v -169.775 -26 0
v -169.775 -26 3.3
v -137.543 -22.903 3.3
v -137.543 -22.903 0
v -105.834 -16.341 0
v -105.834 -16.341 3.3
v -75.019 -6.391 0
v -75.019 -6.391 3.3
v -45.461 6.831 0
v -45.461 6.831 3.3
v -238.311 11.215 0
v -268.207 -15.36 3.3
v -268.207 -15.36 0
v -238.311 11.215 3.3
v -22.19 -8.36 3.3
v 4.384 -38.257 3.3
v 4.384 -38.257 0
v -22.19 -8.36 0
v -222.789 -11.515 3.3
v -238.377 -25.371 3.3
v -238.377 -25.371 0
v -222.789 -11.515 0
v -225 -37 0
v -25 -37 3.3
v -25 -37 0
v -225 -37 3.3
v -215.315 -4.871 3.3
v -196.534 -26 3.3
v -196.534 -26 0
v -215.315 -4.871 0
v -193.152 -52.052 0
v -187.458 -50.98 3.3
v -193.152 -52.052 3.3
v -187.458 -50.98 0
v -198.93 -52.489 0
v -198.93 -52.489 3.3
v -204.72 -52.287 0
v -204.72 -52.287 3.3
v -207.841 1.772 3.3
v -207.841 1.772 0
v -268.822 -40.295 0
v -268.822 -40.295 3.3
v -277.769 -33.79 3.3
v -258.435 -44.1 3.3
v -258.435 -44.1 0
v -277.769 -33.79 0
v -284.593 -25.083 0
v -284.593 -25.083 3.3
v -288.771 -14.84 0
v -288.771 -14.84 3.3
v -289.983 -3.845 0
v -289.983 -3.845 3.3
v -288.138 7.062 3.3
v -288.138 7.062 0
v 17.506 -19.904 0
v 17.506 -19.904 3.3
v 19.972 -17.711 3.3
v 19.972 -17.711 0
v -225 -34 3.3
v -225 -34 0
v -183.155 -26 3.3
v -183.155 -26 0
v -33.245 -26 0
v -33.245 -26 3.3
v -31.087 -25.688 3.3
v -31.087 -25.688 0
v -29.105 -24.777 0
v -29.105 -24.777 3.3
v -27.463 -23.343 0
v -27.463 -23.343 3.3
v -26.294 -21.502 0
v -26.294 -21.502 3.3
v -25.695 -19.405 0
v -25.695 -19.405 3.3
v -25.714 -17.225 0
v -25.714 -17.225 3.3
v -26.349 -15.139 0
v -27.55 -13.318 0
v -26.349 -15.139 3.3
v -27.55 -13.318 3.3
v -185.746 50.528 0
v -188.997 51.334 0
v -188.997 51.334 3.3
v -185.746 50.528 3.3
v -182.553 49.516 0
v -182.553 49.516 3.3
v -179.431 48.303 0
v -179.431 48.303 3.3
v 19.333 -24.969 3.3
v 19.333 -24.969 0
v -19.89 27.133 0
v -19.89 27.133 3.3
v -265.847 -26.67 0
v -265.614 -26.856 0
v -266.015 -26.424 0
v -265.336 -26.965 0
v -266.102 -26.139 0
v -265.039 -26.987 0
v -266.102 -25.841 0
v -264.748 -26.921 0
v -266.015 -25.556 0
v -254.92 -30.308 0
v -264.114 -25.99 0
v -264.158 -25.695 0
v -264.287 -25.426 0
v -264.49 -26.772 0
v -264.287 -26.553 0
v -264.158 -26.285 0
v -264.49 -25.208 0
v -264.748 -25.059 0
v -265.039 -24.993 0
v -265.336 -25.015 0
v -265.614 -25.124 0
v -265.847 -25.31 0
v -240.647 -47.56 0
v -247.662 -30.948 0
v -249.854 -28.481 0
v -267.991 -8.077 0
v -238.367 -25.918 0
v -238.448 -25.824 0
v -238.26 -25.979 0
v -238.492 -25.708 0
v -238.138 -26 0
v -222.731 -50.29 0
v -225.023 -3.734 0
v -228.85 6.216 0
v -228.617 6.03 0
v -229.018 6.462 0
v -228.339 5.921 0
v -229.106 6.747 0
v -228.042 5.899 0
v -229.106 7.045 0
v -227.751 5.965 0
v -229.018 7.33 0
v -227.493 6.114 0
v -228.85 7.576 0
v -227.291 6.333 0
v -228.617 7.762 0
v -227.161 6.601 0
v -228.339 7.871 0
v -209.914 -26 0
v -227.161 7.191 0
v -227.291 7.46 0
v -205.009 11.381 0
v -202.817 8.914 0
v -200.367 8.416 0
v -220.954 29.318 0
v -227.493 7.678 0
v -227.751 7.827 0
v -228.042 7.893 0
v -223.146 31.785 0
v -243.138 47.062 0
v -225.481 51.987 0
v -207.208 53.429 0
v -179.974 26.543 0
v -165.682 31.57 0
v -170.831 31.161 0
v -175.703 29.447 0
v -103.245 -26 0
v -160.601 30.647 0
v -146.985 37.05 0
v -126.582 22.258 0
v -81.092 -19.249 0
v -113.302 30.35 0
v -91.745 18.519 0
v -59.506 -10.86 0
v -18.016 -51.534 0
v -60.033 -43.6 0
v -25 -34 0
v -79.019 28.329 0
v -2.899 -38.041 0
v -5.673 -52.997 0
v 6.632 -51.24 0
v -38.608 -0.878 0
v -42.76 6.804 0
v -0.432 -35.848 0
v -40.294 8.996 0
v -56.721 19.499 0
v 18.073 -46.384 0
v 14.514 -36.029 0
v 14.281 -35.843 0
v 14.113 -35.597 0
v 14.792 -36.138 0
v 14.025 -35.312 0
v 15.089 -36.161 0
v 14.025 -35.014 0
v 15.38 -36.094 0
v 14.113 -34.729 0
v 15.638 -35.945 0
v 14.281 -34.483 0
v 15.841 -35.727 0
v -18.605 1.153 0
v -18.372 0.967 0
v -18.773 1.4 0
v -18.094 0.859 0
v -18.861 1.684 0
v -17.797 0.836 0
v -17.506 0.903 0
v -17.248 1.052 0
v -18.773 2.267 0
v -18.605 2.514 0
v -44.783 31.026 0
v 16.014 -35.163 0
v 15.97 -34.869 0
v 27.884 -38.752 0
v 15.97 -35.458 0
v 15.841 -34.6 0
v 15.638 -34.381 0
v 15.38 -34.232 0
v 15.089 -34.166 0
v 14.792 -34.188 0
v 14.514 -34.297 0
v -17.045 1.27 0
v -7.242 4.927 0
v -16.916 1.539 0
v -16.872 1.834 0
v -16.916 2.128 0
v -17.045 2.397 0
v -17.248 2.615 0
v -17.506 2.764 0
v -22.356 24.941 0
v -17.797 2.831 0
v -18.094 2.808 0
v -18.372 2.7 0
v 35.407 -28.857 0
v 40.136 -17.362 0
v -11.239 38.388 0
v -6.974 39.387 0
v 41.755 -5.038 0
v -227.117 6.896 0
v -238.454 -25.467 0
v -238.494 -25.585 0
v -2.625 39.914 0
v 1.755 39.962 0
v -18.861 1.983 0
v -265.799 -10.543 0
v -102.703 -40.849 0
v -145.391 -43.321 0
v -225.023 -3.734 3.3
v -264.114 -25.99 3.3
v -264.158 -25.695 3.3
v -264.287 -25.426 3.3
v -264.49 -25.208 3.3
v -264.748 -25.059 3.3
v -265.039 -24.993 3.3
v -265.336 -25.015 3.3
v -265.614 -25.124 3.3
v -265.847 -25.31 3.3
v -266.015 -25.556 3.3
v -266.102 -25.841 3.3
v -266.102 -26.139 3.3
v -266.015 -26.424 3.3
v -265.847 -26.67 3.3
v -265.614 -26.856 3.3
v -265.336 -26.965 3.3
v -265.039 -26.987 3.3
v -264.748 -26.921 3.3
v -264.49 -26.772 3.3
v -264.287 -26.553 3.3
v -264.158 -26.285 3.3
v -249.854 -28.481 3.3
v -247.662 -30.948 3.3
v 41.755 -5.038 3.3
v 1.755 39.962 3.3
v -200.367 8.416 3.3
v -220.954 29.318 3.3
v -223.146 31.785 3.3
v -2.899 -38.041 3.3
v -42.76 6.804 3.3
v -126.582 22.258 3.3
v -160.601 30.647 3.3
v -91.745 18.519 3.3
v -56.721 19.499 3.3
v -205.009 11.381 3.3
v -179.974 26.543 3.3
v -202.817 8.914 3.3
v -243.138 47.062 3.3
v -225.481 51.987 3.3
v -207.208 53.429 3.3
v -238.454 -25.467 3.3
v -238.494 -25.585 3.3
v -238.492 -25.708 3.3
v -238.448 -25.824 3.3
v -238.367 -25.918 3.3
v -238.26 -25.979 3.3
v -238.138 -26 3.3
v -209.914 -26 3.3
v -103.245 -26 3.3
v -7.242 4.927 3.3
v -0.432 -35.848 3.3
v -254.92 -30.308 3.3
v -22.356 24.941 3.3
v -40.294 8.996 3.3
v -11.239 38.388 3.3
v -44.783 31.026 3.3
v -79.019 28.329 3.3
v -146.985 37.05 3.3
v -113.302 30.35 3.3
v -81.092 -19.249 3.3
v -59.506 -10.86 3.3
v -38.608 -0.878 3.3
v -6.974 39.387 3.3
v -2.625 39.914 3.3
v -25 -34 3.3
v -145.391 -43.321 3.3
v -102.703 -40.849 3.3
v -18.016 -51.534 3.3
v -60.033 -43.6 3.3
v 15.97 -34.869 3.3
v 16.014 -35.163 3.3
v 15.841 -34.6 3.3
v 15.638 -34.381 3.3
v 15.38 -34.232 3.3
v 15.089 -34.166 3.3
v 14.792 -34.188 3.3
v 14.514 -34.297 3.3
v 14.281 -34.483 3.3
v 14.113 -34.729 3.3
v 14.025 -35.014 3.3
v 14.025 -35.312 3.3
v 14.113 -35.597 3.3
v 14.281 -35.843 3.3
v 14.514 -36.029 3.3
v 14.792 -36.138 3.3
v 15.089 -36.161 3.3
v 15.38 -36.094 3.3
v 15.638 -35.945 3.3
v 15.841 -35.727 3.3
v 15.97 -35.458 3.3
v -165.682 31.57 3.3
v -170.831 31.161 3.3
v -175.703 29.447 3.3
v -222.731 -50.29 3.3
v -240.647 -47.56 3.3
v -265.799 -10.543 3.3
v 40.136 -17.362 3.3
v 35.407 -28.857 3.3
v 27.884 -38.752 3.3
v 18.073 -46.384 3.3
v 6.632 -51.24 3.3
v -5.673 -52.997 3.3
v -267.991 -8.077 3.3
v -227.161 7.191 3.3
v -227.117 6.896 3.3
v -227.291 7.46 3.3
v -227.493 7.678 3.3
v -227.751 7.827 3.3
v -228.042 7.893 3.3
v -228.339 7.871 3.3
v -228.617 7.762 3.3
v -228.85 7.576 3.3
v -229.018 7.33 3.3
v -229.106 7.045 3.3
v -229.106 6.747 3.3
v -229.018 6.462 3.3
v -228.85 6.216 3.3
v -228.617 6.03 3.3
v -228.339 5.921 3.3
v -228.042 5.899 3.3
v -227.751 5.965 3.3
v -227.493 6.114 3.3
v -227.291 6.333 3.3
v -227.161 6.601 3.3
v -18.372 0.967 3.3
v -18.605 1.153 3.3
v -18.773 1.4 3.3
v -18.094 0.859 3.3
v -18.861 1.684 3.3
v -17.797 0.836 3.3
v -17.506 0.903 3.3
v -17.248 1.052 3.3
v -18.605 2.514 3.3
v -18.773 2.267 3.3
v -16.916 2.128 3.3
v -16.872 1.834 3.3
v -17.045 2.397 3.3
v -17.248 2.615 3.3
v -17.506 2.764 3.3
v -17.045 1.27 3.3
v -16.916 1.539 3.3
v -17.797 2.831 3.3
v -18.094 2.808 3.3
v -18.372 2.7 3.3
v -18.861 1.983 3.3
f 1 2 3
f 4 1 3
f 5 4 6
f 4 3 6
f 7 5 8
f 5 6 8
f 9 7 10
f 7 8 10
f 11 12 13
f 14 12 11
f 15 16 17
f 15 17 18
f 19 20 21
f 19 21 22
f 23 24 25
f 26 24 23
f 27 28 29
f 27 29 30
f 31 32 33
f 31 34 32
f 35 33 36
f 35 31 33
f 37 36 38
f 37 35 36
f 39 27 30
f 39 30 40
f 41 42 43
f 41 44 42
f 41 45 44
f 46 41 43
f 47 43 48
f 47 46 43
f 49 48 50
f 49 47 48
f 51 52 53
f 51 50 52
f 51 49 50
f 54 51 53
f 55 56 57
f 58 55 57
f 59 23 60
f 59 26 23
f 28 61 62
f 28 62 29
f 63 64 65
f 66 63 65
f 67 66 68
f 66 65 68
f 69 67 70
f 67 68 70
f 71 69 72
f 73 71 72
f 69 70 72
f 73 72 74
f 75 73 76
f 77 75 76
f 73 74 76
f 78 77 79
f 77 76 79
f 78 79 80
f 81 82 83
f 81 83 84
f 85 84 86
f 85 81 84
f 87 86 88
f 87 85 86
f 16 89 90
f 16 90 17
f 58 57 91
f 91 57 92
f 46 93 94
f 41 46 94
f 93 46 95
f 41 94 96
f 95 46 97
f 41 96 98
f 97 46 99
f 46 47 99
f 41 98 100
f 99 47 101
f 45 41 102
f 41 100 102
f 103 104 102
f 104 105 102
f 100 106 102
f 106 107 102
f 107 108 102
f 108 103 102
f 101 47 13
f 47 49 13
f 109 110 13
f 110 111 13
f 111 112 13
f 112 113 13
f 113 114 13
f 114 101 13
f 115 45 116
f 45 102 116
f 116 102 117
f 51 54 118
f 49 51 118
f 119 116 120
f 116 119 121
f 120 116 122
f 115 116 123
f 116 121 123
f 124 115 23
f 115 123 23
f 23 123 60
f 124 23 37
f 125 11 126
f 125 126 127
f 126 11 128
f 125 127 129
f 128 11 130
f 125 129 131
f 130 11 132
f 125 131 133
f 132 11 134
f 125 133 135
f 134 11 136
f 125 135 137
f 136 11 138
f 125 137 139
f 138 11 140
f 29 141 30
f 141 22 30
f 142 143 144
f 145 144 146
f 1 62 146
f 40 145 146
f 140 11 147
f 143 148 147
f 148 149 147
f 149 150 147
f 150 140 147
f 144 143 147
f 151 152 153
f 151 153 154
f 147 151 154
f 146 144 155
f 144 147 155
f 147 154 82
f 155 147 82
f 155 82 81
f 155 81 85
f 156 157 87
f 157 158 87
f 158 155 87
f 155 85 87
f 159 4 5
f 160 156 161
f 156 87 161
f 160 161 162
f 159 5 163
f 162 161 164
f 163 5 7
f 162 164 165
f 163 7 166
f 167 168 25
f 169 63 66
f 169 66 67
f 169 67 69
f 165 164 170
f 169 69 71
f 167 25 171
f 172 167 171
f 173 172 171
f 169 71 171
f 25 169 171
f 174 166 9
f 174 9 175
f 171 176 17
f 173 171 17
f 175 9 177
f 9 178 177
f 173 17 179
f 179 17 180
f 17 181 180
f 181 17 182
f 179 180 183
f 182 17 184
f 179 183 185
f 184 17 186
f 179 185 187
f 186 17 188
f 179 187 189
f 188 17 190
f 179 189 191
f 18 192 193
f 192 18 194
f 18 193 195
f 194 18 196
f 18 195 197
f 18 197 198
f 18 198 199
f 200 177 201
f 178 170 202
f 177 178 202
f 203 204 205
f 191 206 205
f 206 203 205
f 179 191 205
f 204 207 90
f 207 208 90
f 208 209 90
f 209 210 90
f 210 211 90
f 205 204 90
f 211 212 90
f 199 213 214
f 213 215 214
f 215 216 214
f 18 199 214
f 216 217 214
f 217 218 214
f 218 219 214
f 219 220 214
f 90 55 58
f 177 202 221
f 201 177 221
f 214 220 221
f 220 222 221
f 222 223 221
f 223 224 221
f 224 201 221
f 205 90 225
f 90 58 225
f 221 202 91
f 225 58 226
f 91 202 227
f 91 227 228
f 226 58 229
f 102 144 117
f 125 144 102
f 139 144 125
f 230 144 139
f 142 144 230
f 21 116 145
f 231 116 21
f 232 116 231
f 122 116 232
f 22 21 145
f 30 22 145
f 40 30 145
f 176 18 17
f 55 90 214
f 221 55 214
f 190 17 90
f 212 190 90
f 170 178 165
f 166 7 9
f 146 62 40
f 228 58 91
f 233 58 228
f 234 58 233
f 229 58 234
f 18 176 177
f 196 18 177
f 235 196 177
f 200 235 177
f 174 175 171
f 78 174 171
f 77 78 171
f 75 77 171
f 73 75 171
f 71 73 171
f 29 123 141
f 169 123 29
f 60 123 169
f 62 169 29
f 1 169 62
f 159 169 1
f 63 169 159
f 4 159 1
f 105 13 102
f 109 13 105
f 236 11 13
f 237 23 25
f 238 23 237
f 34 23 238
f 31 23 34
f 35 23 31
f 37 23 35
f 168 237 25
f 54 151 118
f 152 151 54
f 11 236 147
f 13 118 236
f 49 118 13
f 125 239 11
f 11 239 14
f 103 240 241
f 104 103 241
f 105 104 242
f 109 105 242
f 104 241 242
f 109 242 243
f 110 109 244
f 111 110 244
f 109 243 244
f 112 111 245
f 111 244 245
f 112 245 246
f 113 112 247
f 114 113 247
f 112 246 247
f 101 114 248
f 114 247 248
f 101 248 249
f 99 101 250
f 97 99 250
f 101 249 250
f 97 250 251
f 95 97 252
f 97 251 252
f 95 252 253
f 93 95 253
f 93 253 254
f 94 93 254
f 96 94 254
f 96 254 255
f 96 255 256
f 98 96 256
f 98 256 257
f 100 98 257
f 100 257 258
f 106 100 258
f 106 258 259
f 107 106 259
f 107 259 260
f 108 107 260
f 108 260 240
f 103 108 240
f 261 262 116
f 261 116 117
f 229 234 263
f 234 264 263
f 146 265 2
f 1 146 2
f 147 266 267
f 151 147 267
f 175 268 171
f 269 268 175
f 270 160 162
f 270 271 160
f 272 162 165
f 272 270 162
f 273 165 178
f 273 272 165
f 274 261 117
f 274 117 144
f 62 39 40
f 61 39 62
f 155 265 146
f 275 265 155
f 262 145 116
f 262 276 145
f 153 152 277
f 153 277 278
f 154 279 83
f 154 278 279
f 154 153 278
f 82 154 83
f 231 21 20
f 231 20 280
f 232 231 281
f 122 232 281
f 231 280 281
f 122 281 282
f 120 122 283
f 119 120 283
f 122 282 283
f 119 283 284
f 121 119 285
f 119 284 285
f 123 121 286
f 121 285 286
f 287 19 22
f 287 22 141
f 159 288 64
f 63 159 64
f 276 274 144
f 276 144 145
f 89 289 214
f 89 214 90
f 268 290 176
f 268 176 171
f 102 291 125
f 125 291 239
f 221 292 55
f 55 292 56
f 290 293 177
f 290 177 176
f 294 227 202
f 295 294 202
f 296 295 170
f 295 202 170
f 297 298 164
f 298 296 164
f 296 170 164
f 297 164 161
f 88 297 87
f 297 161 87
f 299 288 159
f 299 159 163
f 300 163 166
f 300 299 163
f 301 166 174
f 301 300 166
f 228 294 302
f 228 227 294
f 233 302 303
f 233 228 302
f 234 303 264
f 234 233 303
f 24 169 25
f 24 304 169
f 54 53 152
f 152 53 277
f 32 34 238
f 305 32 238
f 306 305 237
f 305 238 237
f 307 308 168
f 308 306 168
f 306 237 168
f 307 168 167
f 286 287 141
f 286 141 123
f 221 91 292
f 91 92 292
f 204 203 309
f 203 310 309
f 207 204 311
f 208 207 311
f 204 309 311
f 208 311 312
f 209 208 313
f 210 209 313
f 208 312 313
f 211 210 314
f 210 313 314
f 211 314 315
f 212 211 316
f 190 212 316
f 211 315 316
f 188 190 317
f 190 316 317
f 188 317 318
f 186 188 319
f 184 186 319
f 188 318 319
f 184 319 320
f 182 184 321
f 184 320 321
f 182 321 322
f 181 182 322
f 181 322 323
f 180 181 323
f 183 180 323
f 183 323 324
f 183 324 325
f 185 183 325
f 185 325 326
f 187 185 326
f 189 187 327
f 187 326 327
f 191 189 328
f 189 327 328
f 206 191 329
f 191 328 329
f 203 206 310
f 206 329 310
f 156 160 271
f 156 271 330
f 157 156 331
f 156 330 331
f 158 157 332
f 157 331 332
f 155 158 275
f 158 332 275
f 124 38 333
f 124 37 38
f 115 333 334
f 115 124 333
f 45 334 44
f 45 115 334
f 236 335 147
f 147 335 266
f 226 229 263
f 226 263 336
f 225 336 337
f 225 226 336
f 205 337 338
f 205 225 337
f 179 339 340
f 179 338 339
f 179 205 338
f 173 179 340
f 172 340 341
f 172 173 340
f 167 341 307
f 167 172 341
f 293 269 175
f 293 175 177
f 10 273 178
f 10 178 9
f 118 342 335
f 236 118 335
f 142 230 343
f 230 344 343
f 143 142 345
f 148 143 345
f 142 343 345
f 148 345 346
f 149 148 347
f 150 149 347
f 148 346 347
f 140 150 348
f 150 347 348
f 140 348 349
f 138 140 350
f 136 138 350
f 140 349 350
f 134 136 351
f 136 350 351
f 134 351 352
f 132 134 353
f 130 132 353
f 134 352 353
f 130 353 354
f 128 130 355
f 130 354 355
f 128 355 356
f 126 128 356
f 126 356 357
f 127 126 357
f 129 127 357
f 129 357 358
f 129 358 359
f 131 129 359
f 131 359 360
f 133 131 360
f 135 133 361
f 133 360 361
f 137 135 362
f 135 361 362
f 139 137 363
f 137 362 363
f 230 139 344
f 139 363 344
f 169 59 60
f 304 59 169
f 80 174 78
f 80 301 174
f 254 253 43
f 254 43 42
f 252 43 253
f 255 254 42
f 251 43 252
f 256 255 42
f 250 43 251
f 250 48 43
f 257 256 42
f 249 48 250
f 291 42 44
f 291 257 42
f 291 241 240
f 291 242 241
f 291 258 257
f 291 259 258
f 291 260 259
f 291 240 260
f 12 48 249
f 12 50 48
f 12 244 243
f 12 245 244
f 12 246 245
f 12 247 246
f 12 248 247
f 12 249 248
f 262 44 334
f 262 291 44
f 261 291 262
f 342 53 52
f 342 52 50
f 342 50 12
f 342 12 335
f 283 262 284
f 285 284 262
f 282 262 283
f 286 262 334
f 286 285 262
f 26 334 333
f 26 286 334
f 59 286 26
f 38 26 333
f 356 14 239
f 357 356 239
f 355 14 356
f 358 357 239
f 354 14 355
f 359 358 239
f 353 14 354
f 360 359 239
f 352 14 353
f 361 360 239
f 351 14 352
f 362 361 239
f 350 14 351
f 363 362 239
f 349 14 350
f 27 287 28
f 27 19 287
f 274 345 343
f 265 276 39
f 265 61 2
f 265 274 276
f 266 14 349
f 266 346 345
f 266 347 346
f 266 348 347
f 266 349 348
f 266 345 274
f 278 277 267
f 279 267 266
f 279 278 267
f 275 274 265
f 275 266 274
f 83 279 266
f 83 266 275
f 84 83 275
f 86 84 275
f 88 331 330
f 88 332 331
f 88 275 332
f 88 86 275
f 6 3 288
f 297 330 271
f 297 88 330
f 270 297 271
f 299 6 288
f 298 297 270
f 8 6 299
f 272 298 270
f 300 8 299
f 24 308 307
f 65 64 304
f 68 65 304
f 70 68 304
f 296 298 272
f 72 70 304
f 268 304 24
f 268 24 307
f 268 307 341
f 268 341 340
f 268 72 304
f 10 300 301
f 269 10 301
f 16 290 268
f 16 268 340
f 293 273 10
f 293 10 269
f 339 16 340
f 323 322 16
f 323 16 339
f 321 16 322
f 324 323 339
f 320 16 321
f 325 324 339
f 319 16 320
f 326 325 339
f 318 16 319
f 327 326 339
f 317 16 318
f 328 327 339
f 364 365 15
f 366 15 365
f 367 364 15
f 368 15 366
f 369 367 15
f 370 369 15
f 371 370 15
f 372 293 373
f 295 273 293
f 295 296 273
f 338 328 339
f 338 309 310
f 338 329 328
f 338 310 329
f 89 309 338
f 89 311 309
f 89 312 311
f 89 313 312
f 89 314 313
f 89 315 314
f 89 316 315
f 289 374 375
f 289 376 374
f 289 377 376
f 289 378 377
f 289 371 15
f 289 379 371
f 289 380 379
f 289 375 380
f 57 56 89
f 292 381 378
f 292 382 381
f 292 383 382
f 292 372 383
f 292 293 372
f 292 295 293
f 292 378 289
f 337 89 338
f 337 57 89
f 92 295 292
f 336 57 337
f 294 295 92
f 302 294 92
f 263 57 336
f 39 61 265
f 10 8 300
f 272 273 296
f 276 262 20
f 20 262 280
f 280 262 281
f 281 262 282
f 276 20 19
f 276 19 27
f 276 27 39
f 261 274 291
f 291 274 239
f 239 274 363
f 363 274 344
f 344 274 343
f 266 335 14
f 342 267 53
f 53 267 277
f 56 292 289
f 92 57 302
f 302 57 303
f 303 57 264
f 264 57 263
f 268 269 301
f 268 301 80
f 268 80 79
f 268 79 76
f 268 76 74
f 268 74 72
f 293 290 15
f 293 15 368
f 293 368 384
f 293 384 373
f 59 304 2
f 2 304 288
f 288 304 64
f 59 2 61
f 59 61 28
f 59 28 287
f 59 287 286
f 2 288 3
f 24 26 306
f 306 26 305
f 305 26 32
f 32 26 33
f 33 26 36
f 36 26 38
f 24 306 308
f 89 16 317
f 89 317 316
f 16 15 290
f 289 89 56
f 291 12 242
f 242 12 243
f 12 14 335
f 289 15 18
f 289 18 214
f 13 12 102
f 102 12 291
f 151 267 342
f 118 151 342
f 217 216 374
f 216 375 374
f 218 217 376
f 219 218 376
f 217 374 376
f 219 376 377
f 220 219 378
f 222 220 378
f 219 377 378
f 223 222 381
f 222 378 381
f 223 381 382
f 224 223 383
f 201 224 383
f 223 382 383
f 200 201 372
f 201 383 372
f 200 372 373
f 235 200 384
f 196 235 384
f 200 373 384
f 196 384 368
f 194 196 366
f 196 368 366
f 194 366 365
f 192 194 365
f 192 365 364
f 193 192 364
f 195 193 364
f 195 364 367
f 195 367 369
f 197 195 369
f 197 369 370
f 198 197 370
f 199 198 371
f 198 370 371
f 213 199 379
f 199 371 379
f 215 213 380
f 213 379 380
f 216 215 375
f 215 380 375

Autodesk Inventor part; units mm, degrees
ref_plane "YZ Plane" through (0, 0, 0) normal (1, 0, 0) x (0, 1, 0)
ref_plane "XZ Plane" through (0, 0, 0) normal (0, 1, 0) x (-1, 0, 0)
ref_plane "XY Plane" through (0, 0, 0) normal (0, 0, 1) x (1, 0, 0)
sketch "Boceto2" plane through (0, 0, 0) normal (0, 0, 1) x (1, 0, 0)
  circle A0 centre (0, 0) radius 40
  circle A1 centre (-200, 0) radius 52.5
  circle A2 centre (-250, -5) radius 40
  arc A3 (-258.4353, -44.1005) -> (-204.7198, -52.2874) centre (-164.804, 389.9147) ccw
  arc A4 (-188.9974, 51.3341) -> (-279.8859, 21.5863) centre (-208.9069, -41.5562) ccw
  arc A5 (-179.4312, 48.3029) -> (-11.2392, 38.3885) centre (-81.4844, 278.3169) ccw
  arc A6 (-46.5935, -31) -> (31.225, 25) centre (-6.245, -5) ccw
  arc A7 (-18.0162, -51.5343) -> (-187.4585, -50.98) centre (-103.8482, -390.8466) ccw
  dimension "d42" = 80
  dimension "d43" = 200
  dimension "d44" = 105
  dimension "d45" = 80
  dimension "d46" = 50
  dimension "d47" = 5
  dimension "d48" = 444
  dimension "d49" = 95
  dimension "d50" = 250
  dimension "d51" = 350
  dimension "d52" = 5
  dimension "d53" = 48
  dimension "d54" = 31
extrude "Extrusión1" add sketch "Boceto2" along normal blind 3.3
sketch "Boceto3" plane through (0, 0, 3.3) normal (0, 0, 1) x (1, 0, 0)
  arc A0 (-179.4312, 48.3029) -> (-11.2392, 38.3885) centre (-81.4844, 278.3169) ccw projected
  arc A1 (31.225, 25) -> (-11.2392, 38.3885) centre (0, 0) ccw projected
  arc A2 (-179.4312, 48.3029) -> (-11.2392, 38.3885) centre (-81.4844, 278.3169) ccw projected
  arc A3 (-179.4312, 48.3029) -> (-188.9974, 51.3341) centre (-200, 0) ccw projected
  arc A4 (-188.9974, 51.3341) -> (-279.8859, 21.5863) centre (-208.9069, -41.5562) ccw projected
  arc A5 (-279.8859, 21.5863) -> (-258.4353, -44.1005) centre (-250, -5) ccw projected
  arc A6 (-258.4353, -44.1005) -> (-204.7198, -52.2874) centre (-164.804, 389.9147) ccw projected
  arc A7 (-204.7198, -52.2874) -> (-187.4585, -50.98) centre (-200, 0) ccw projected
  arc A8 (-18.0162, -51.5343) -> (-187.4585, -50.98) centre (-103.8482, -390.8466) ccw projected
  arc A9 (-18.0162, -51.5343) -> (31.225, 25) centre (-6.245, -5) ccw projected
  arc A10 (-18.0162, -51.5343) -> (31.225, 25) centre (-6.245, -5) ccw projected
  arc A11 (31.225, 25) -> (-11.2392, 38.3885) centre (0, 0) ccw projected
  line L0 (1.755, 39.9615) -> (41.755, -5.0385)
  arc A12 (-279.8859, 21.5863) -> (-258.4353, -44.1005) centre (-250, -5) ccw projected
  line L1 (-288.1379, 7.0623) -> (-243.1379, 47.0623)
  arc A13 (-188.9974, 51.3341) -> (-279.8859, 21.5863) centre (-208.9069, -41.5562) ccw projected
  line L2 (-7.2418, 4.9269) -> (19.3327, -24.9694)
  line L3 (19.3327, -24.9694) -> (4.3845, -38.2567)
  line L4 (4.3845, -38.2567) -> (-22.19, -8.3603)
  line L5 (-22.19, -8.3603) -> (-7.2418, 4.9269)
  line L6 (-268.207, -15.36) -> (-254.9197, -30.3082)
  line L7 (-254.9197, -30.3082) -> (-225.0234, -3.7336)
  line L8 (-225.0234, -3.7336) -> (-238.3106, 11.2146)
  line L9 (-268.207, -15.36) -> (-238.3106, 11.2146)
  line L10 (-265.7987, -10.5434) -> (-220.9541, 29.3185)
  line L11 (-223.1465, 31.7849) -> (-267.9911, -8.0769)
  line L12 (-249.854, -28.4812) -> (-205.0094, 11.3807)
  line L13 (-205.0094, 11.3807) -> (-202.817, 8.9142)
  line L14 (-202.817, 8.9142) -> (-247.6616, -30.9476)
  line L15 (-247.6616, -30.9476) -> (-249.854, -28.4812)
  circle A14 centre (-228.1168, 6.8962) radius 1
  circle A15 centre (-265.1136, -25.9898) radius 1
  line L16 (-22.3561, 24.9409) -> (17.5057, -19.9037)
  line L17 (17.5057, -19.9037) -> (19.9722, -17.7113)
  line L18 (19.9722, -17.7113) -> (-19.8897, 27.1333)
  line L19 (-19.8897, 27.1333) -> (-22.3561, 24.9409)
  line L20 (-40.2939, 8.9962) -> (-0.4321, -35.8484)
  line L21 (-0.4321, -35.8484) -> (-2.8986, -38.0408)
  line L22 (-2.8986, -38.0408) -> (-42.7604, 6.8038)
  line L23 (-42.7604, 6.8038) -> (-40.2939, 8.9962)
  circle A16 centre (-17.8717, 1.8335) radius 1
  circle A17 centre (15.0143, -35.1633) radius 1
  arc A18 (-18.0162, -51.5343) -> (-187.4585, -50.98) centre (-103.8482, -390.8466) ccw projected
  line L24 (-220.9541, 29.3185) -> (-223.1465, 31.7849)
  line L25 (-267.9911, -8.0769) -> (-265.7987, -10.5434)
  line L26 (-253.2588, -2.0727) -> (-239.9715, -17.0209) construction
  line L27 (-8.9028, -23.3085) -> (6.0454, -10.0212) construction
  line L28 (-225, -34) -> (-25, -34)
  line L29 (-25, -34) -> (-25, -37)
  line L30 (-25, -37) -> (-225, -37)
  line L31 (-225, -37) -> (-225, -34)
  dimension "d59" = 40
  dimension "d60" = 45
  dimension "d61" = 40
  dimension "d62" = 45
  dimension "d65" = 40
  dimension "d66" = 20
  dimension "d68" = 30
  dimension "d69" = 0
  dimension "d70" = 40
  dimension "d71" = 20
  dimension "d73" = 30
  dimension "d74" = 0
  dimension "d75" = 2
  dimension "d76" = 2
  dimension "d77" = 3.3
  dimension "d78" = 3.3
  dimension "d80" = 60
  dimension "d84" = 2
  dimension "d85" = 2
  dimension "d86" = 4.75
  dimension "d87" = 10
  dimension "d88" = 4.75
  dimension "d89" = 10
  dimension "d90" = 2
  dimension "d91" = 2
  dimension "d94" = 3.3
  dimension "d95" = 3.3
  dimension "d96" = 60
  dimension "d97" = 60
  dimension "d98" = 2
  dimension "d99" = 10
  dimension "d100" = 10
  dimension "d101" = 4.75
  dimension "d102" = 4.75
  dimension "d103" = 60
  dimension "d105" = 15
  dimension "d106" = 15
  dimension "d107" = 15
  dimension "d108" = 15
  dimension "d109" = 3
  dimension "d110" = 34
  dimension "d111" = 200
  dimension "d112" = 25
extrude "Extrusión2" cut sketch "Boceto3" against normal blind 3.3 contours A1 A9 L0 | L1 A5 A4 | L2 L3 L4 L5 | L9 L8 L7 L6 | L25 L11 L24 L10 | L12 L13 L14 L15 | A14 | A15 | L19 L18 L17 L16 | L20 L21 L22 L23 | A16 | A17 | L28 L29 L30 L31
sketch "Sketch4" plane through (0, 0, 3.3) normal (0, 0, 1) x (1, 0, 0)
  arc A0 (-179.4312, 48.3029) -> (-11.2392, 38.3885) centre (-81.4844, 278.3169) ccw projected
  line L0 (-225, -34) -> (-25, -34) projected
  arc A1 (-179.4312, 48.3029) -> (-188.9974, 51.3341) centre (-200, 0) ccw projected
  arc A2 (-188.9974, 51.3341) -> (-243.1379, 47.0623) centre (-208.9069, -41.5562) ccw projected
  line L1 (-209.9139, -26) -> (-238.1379, -26)
  line L2 (41.755, -5.0385) -> (1.755, 39.9615) projected
  arc A3 (1.755, 39.9615) -> (-11.2392, 38.3885) centre (0, 0) ccw projected
  arc A4 (-179.4312, 48.3029) -> (-11.2392, 38.3885) centre (-81.4844, 278.3169) ccw projected
  arc A5 (-179.4312, 48.3029) -> (-188.9974, 51.3341) centre (-200, 0) ccw projected
  arc A6 (-188.9974, 51.3341) -> (-243.1379, 47.0623) centre (-208.9069, -41.5562) ccw projected
  line L3 (-243.1379, 47.0623) -> (-288.1379, 7.0623) projected
  arc A7 (-288.1379, 7.0623) -> (-258.4353, -44.1005) centre (-250, -5) ccw projected
  arc A8 (-258.4353, -44.1005) -> (-204.7198, -52.2874) centre (-164.804, 389.9147) ccw projected
  arc A9 (-204.7198, -52.2874) -> (-187.4585, -50.98) centre (-200, 0) ccw projected
  arc A10 (-18.0162, -51.5343) -> (-187.4585, -50.98) centre (-103.8482, -390.8466) ccw projected
  arc A11 (-18.0162, -51.5343) -> (41.755, -5.0385) centre (-6.245, -5) ccw projected
  line L4 (-225.0234, -3.7336) -> (-254.9197, -30.3082) projected
  line L5 (-254.9197, -30.3082) -> (-268.207, -15.36) projected
  line L6 (-268.207, -15.36) -> (-238.3106, 11.2146) projected
  line L7 (-238.3106, 11.2146) -> (-225.0234, -3.7336) projected
  line L8 (-247.6616, -30.9476) -> (-249.854, -28.4812) projected
  line L9 (-249.854, -28.4812) -> (-205.0094, 11.3807) projected
  line L10 (-205.0094, 11.3807) -> (-202.817, 8.9142) projected
  line L11 (-202.817, 8.9142) -> (-247.6616, -30.9476) projected
  line L12 (19.9722, -17.7113) -> (17.5057, -19.9037) projected
  line L13 (17.5057, -19.9037) -> (-22.3561, 24.9409) projected
  line L14 (-22.3561, 24.9409) -> (-19.8897, 27.1333) projected
  line L15 (-19.8897, 27.1333) -> (19.9722, -17.7113) projected
  circle A12 centre (15.0143, -35.1633) radius 1 projected
  circle A13 centre (-265.1136, -25.9898) radius 1 projected
  circle A14 centre (-228.1168, 6.8962) radius 1 projected
  circle A15 centre (-17.8717, 1.8335) radius 1 projected
  line L16 (-42.7604, 6.8038) -> (-40.2939, 8.9962) projected
  line L17 (-40.2939, 8.9962) -> (-0.4321, -35.8484) projected
  line L18 (-0.4321, -35.8484) -> (-2.8986, -38.0408) projected
  line L19 (-2.8986, -38.0408) -> (-42.7604, 6.8038) projected
  line L20 (-223.1465, 31.7849) -> (-220.9541, 29.3185) projected
  line L21 (-220.9541, 29.3185) -> (-265.7987, -10.5434) projected
  line L22 (-265.7987, -10.5434) -> (-267.9911, -8.0769) projected
  line L23 (-267.9911, -8.0769) -> (-223.1465, 31.7849) projected
  line L24 (-22.19, -8.3603) -> (-7.2418, 4.9269) projected
  line L25 (-7.2418, 4.9269) -> (19.3327, -24.9694) projected
  line L26 (19.3327, -24.9694) -> (4.3845, -38.2567) projected
  line L27 (4.3845, -38.2567) -> (-22.19, -8.3603) projected
  line L28 (-225, -37) -> (-225, -34) projected
  line L29 (-225, -34) -> (-25, -34) projected
  line L30 (-25, -34) -> (-25, -37) projected
  line L31 (-25, -37) -> (-225, -37) projected
  line L32 (-202.817, 8.9142) -> (-247.6616, -30.9476) projected
  arc A16 (-238.3772, -25.3707) -> (-238.1379, -26) centre (-238.1379, -25.6399) ccw
  line L33 (-238.3772, -25.3707) -> (-222.7894, -11.515)
  line L34 (-222.7894, -11.515) -> (-209.9139, -26)
  line L35 (-196.5343, -26) -> (-215.3153, -4.8713)
  line L36 (-215.3153, -4.8713) -> (-207.8412, 1.7723)
  line L37 (-207.8412, 1.7723) -> (-183.1548, -26)
  line L38 (-183.1548, -26) -> (-196.5343, -26)
  line L39 (-200.3672, 8.4159) -> (-169.7752, -26)
  line L40 (-200.3672, 8.4159) -> (-179.974, 26.5432)
  arc A17 (-160.6008, 30.6466) -> (-179.974, 26.5432) centre (-166.6867, 11.595) ccw
  arc A18 (-160.6008, 30.6466) -> (-56.7209, 19.4989) centre (-81.4844, 278.3169) ccw
  line L41 (-56.7209, 19.4989) -> (-45.4609, 6.8314)
  arc A19 (-103.245, -26) -> (-38.6081, -0.8779) centre (-182.2347, 272.9473) ccw
  line L42 (-267.9911, -8.0769) -> (-223.1465, 31.7849) projected
  arc A20 (-18.0162, -51.5343) -> (41.755, -5.0385) centre (-6.245, -5) ccw projected
  line L43 (-103.245, -26) -> (-33.245, -26)
  arc A21 (-33.245, -26) -> (-27.5501, -13.3183) centre (-33.245, -18.3804) ccw
  line L44 (-38.6081, -0.8779) -> (-27.5501, -13.3183)
  line L45 (-2.8986, -38.0408) -> (-42.7604, 6.8038) projected
  line L46 (-42.7604, 6.8038) -> (-40.2939, 8.9962) projected
  arc A22 (-169.7752, -26) -> (-45.4609, 6.8314) centre (-182.2347, 272.9473) ccw
  line L47 (-223.1465, 31.7849) -> (-220.9541, 29.3185) projected
  dimension "d113" = 10
  dimension "d114" = 10
  dimension "d115" = 10
  dimension "d117" = 10
  dimension "d119" = 50
  dimension "d121" = 10
  dimension "d126" = 10
  dimension "d129" = 10
  dimension "d130" = 75
  dimension "d131" = 70
  dimension "d132" = 20
  dimension "d136" = 10
  dimension "d139" = 10
extrude "Extrusión5" cut sketch "Sketch4" against normal blind 10 contours L1 A16 L33 L34 | L35 L36 L37 L38 | L40 A17 A18 L41 A22 L39 | A19 L44 A21 L43
equation "\"d45\" = d42"
equation "\"d65\" = altura_servo"
equation "\"d66\" = base_servo"
equation "\"d70\" = d65"
equation "\"d71\" = d66"
equation "\"d78\" = d77"
equation "\"d84\" = agujero_servo"
equation "\"d85\" = d84"
equation "\"d87\" = 0.5 * d71"
equation "\"d88\" = d86"
equation "\"d89\" = 0.5 * d71"
equation "\"d91\" = d90"
equation "\"d95\" = d94"
equation "\"d97\" = d96"
equation "\"d98\" = agujero_servo"
equation "\"d99\" = 0.5 * d66"
equation "\"d100\" = d99"
equation "\"d102\" = d101"
equation "\"soporte\" = 60"
equation "\"largo_base\" = 200"
equation "\"altura_servo\" = 40"
equation "\"base_servo\" = 20"
equation "\"agujero_servo\" = 2"
properties part number "Cuerpo - Lateral"
